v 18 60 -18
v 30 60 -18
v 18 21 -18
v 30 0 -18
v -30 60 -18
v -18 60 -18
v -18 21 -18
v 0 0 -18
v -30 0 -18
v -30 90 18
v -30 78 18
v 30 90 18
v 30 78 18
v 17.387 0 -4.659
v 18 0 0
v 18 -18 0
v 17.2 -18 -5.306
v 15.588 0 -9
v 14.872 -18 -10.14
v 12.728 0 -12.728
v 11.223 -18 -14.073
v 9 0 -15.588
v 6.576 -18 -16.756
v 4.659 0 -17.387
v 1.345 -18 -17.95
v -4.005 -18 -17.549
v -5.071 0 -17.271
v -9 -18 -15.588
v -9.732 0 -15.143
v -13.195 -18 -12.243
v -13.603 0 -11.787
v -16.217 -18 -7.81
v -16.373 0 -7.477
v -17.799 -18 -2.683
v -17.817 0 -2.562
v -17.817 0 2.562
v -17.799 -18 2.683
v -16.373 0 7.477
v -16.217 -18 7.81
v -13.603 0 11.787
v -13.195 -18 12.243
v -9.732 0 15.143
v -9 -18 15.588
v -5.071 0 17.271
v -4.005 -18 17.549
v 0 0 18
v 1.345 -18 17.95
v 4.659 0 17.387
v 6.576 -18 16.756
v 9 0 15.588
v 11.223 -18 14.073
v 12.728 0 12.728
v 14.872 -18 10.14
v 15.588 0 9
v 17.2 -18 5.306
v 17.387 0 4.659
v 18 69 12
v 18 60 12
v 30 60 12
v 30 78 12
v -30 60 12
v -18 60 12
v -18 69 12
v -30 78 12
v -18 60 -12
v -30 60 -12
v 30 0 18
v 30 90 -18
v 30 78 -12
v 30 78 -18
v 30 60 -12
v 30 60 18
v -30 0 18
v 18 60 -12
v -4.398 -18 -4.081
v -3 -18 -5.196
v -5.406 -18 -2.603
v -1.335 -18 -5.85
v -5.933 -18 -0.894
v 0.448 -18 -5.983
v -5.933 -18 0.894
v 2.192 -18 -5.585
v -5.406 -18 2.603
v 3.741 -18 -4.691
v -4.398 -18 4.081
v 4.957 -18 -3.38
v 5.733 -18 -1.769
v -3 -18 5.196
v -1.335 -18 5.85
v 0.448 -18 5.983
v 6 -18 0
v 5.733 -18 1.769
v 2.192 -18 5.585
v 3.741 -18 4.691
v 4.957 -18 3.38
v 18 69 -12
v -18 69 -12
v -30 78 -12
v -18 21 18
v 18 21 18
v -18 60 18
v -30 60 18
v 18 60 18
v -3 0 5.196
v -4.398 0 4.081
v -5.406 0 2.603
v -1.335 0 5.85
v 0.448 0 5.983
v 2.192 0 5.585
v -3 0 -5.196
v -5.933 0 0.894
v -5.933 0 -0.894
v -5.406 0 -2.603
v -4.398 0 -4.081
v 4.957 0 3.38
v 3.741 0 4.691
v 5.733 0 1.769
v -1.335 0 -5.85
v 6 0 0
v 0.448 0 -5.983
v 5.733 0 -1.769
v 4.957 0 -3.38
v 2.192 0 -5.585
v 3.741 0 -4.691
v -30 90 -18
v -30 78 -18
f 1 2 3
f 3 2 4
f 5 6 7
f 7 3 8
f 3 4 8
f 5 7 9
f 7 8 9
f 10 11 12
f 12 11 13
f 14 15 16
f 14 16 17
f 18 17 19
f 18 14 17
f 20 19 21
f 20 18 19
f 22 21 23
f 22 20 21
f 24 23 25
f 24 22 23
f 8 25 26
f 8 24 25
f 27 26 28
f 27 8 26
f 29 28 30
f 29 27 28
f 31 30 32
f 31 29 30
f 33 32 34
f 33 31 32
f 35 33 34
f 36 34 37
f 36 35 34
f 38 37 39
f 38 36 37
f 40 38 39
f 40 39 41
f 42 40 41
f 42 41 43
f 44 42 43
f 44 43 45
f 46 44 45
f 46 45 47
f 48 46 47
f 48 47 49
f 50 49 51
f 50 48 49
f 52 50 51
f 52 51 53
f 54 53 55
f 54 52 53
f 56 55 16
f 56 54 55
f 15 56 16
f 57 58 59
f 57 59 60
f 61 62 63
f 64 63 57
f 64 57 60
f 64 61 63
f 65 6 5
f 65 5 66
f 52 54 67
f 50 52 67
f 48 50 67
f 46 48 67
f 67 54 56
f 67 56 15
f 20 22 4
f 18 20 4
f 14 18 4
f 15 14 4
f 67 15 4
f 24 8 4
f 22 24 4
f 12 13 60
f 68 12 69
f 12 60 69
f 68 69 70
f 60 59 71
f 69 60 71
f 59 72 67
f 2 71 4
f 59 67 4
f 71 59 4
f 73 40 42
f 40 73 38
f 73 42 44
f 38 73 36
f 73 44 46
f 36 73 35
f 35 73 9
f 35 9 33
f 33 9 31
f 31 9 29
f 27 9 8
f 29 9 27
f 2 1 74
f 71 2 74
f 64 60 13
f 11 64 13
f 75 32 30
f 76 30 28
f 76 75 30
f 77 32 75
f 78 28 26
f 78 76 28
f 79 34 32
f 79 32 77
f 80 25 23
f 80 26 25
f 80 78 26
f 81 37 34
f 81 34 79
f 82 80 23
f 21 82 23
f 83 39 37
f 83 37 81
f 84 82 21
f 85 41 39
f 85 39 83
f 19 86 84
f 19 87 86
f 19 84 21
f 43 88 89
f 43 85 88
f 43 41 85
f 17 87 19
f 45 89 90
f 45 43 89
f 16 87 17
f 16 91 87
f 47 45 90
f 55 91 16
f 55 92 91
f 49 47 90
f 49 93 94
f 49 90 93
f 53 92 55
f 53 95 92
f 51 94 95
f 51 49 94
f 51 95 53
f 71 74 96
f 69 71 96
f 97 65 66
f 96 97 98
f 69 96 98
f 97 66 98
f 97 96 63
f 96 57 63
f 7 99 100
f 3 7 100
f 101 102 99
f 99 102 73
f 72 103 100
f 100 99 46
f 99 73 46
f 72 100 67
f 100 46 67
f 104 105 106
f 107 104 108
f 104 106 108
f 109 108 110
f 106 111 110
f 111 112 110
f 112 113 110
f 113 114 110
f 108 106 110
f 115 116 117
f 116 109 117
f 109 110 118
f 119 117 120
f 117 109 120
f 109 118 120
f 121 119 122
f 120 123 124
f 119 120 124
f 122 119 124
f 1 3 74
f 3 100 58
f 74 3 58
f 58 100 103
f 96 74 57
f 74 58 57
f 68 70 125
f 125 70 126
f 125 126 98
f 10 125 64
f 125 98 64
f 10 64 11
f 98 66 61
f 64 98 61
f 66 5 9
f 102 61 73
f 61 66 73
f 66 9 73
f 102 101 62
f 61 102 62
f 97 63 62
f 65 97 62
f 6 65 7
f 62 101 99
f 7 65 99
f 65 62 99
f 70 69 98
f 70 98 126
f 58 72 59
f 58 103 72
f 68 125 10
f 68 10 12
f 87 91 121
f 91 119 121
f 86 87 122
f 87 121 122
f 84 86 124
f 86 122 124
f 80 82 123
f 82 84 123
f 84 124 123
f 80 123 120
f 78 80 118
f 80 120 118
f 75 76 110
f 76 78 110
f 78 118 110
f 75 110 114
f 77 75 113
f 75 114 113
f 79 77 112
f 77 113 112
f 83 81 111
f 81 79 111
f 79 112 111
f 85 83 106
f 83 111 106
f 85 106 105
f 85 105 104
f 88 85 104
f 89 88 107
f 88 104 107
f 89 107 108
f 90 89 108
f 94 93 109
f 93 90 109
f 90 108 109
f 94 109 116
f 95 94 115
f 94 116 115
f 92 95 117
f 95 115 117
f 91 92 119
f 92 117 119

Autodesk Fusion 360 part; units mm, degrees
sketch "Sketch1" plane through (0, 0, 0) normal (0, 1, 0) x (1, 0, 0)
  line L0 (30, 18) -> (-30, 18)
  line L1 (-30, 18) -> (-30, -18)
  line L2 (-30, -18) -> (30, -18)
  line L3 (30, -18) -> (30, 18)
extrude "Extrude1" add sketch "Sketch1" along normal blind 90
sketch "Sketch2" plane through (0, 0, 0) normal (0, -1, 0) x (1, 0, 0)
  line L0 (30, -18) -> (30, 18)
  line L1 (30, 18) -> (-30, 18)
  line L2 (-30, 18) -> (-30, -18)
  line L3 (-30, -18) -> (30, -18)
  circle A0 centre (0, 0) radius 18
  circle A1 centre (0, 0) radius 6
  dimension "d5" = 12
extrude "Extrude2" add sketch "Sketch2" along normal blind 18 contours A0
thread "Thread1" thread offset 0 thread length 10
sketch "Sketch3" plane through (-30, 0, 0) normal (-1, 0, 0) x (0, -1, 0)
  line L0 (0, -18) -> (0, 18)
  line L1 (0, 18) -> (-90, 18)
  line L2 (-90, 18) -> (-90, -18)
  line L3 (-90, -18) -> (0, -18)
  line L4 (-78, -18) -> (-60, -18)
  line L5 (-60, -18) -> (-60, -12)
  line L6 (-60, -12) -> (-78, -12)
  line L7 (-78, -12) -> (-78, -18)
extrude "Extrude3" cut sketch "Sketch3" against normal blind 60 contours L3 L4 L5 L6 L7
sketch "Sketch4" plane through (-30, 0, 0) normal (-1, 0, 0) x (0, -1, 0)
  line L0 (-78, -18) -> (-78, -12)
  line L1 (-78, -12) -> (-60, -12)
  line L2 (-60, -12) -> (-60, -18)
  line L3 (-60, -18) -> (0, -18)
  line L4 (0, -18) -> (0, 18)
  line L5 (0, 18) -> (-90, 18)
  line L6 (-90, 18) -> (-90, -18)
  line L7 (-90, -18) -> (-78, -18)
  line L8 (-78, 18) -> (-60, 18)
  line L9 (-60, 18) -> (-60, 12)
  line L10 (-60, 12) -> (-78, 12)
  line L11 (-78, 12) -> (-78, 18)
extrude "Extrude4" cut sketch "Sketch4" against normal blind 60 contours L5 L8 L9 L10 L11
sketch "Sketch5" plane through (0, 0, 18) normal (0, 0, 1) x (-1, 0, 0)
  line L0 (-30, -60) -> (30, -60)
  line L1 (30, -60) -> (30, 0)
  line L2 (30, 0) -> (0, 0)
  line L3 (0, 0) -> (-30, 0)
  line L4 (-30, 0) -> (-30, -60)
  line L5 (-30, 0) -> (-30, -21)
  line L6 (-18, -21) -> (-18, -69)
  line L7 (-18, -69) -> (18, -69)
  line L8 (18, -69) -> (18, -21)
  line L9 (18, -21) -> (-18, -21)
  dimension "d21" = 12
  dimension "d22" = 48
  dimension "d23" = 36
extrude "Extrude5" cut sketch "Sketch5" against normal blind 36 contours L0 L6 L8 L9 | L0 L6 L7 L8
